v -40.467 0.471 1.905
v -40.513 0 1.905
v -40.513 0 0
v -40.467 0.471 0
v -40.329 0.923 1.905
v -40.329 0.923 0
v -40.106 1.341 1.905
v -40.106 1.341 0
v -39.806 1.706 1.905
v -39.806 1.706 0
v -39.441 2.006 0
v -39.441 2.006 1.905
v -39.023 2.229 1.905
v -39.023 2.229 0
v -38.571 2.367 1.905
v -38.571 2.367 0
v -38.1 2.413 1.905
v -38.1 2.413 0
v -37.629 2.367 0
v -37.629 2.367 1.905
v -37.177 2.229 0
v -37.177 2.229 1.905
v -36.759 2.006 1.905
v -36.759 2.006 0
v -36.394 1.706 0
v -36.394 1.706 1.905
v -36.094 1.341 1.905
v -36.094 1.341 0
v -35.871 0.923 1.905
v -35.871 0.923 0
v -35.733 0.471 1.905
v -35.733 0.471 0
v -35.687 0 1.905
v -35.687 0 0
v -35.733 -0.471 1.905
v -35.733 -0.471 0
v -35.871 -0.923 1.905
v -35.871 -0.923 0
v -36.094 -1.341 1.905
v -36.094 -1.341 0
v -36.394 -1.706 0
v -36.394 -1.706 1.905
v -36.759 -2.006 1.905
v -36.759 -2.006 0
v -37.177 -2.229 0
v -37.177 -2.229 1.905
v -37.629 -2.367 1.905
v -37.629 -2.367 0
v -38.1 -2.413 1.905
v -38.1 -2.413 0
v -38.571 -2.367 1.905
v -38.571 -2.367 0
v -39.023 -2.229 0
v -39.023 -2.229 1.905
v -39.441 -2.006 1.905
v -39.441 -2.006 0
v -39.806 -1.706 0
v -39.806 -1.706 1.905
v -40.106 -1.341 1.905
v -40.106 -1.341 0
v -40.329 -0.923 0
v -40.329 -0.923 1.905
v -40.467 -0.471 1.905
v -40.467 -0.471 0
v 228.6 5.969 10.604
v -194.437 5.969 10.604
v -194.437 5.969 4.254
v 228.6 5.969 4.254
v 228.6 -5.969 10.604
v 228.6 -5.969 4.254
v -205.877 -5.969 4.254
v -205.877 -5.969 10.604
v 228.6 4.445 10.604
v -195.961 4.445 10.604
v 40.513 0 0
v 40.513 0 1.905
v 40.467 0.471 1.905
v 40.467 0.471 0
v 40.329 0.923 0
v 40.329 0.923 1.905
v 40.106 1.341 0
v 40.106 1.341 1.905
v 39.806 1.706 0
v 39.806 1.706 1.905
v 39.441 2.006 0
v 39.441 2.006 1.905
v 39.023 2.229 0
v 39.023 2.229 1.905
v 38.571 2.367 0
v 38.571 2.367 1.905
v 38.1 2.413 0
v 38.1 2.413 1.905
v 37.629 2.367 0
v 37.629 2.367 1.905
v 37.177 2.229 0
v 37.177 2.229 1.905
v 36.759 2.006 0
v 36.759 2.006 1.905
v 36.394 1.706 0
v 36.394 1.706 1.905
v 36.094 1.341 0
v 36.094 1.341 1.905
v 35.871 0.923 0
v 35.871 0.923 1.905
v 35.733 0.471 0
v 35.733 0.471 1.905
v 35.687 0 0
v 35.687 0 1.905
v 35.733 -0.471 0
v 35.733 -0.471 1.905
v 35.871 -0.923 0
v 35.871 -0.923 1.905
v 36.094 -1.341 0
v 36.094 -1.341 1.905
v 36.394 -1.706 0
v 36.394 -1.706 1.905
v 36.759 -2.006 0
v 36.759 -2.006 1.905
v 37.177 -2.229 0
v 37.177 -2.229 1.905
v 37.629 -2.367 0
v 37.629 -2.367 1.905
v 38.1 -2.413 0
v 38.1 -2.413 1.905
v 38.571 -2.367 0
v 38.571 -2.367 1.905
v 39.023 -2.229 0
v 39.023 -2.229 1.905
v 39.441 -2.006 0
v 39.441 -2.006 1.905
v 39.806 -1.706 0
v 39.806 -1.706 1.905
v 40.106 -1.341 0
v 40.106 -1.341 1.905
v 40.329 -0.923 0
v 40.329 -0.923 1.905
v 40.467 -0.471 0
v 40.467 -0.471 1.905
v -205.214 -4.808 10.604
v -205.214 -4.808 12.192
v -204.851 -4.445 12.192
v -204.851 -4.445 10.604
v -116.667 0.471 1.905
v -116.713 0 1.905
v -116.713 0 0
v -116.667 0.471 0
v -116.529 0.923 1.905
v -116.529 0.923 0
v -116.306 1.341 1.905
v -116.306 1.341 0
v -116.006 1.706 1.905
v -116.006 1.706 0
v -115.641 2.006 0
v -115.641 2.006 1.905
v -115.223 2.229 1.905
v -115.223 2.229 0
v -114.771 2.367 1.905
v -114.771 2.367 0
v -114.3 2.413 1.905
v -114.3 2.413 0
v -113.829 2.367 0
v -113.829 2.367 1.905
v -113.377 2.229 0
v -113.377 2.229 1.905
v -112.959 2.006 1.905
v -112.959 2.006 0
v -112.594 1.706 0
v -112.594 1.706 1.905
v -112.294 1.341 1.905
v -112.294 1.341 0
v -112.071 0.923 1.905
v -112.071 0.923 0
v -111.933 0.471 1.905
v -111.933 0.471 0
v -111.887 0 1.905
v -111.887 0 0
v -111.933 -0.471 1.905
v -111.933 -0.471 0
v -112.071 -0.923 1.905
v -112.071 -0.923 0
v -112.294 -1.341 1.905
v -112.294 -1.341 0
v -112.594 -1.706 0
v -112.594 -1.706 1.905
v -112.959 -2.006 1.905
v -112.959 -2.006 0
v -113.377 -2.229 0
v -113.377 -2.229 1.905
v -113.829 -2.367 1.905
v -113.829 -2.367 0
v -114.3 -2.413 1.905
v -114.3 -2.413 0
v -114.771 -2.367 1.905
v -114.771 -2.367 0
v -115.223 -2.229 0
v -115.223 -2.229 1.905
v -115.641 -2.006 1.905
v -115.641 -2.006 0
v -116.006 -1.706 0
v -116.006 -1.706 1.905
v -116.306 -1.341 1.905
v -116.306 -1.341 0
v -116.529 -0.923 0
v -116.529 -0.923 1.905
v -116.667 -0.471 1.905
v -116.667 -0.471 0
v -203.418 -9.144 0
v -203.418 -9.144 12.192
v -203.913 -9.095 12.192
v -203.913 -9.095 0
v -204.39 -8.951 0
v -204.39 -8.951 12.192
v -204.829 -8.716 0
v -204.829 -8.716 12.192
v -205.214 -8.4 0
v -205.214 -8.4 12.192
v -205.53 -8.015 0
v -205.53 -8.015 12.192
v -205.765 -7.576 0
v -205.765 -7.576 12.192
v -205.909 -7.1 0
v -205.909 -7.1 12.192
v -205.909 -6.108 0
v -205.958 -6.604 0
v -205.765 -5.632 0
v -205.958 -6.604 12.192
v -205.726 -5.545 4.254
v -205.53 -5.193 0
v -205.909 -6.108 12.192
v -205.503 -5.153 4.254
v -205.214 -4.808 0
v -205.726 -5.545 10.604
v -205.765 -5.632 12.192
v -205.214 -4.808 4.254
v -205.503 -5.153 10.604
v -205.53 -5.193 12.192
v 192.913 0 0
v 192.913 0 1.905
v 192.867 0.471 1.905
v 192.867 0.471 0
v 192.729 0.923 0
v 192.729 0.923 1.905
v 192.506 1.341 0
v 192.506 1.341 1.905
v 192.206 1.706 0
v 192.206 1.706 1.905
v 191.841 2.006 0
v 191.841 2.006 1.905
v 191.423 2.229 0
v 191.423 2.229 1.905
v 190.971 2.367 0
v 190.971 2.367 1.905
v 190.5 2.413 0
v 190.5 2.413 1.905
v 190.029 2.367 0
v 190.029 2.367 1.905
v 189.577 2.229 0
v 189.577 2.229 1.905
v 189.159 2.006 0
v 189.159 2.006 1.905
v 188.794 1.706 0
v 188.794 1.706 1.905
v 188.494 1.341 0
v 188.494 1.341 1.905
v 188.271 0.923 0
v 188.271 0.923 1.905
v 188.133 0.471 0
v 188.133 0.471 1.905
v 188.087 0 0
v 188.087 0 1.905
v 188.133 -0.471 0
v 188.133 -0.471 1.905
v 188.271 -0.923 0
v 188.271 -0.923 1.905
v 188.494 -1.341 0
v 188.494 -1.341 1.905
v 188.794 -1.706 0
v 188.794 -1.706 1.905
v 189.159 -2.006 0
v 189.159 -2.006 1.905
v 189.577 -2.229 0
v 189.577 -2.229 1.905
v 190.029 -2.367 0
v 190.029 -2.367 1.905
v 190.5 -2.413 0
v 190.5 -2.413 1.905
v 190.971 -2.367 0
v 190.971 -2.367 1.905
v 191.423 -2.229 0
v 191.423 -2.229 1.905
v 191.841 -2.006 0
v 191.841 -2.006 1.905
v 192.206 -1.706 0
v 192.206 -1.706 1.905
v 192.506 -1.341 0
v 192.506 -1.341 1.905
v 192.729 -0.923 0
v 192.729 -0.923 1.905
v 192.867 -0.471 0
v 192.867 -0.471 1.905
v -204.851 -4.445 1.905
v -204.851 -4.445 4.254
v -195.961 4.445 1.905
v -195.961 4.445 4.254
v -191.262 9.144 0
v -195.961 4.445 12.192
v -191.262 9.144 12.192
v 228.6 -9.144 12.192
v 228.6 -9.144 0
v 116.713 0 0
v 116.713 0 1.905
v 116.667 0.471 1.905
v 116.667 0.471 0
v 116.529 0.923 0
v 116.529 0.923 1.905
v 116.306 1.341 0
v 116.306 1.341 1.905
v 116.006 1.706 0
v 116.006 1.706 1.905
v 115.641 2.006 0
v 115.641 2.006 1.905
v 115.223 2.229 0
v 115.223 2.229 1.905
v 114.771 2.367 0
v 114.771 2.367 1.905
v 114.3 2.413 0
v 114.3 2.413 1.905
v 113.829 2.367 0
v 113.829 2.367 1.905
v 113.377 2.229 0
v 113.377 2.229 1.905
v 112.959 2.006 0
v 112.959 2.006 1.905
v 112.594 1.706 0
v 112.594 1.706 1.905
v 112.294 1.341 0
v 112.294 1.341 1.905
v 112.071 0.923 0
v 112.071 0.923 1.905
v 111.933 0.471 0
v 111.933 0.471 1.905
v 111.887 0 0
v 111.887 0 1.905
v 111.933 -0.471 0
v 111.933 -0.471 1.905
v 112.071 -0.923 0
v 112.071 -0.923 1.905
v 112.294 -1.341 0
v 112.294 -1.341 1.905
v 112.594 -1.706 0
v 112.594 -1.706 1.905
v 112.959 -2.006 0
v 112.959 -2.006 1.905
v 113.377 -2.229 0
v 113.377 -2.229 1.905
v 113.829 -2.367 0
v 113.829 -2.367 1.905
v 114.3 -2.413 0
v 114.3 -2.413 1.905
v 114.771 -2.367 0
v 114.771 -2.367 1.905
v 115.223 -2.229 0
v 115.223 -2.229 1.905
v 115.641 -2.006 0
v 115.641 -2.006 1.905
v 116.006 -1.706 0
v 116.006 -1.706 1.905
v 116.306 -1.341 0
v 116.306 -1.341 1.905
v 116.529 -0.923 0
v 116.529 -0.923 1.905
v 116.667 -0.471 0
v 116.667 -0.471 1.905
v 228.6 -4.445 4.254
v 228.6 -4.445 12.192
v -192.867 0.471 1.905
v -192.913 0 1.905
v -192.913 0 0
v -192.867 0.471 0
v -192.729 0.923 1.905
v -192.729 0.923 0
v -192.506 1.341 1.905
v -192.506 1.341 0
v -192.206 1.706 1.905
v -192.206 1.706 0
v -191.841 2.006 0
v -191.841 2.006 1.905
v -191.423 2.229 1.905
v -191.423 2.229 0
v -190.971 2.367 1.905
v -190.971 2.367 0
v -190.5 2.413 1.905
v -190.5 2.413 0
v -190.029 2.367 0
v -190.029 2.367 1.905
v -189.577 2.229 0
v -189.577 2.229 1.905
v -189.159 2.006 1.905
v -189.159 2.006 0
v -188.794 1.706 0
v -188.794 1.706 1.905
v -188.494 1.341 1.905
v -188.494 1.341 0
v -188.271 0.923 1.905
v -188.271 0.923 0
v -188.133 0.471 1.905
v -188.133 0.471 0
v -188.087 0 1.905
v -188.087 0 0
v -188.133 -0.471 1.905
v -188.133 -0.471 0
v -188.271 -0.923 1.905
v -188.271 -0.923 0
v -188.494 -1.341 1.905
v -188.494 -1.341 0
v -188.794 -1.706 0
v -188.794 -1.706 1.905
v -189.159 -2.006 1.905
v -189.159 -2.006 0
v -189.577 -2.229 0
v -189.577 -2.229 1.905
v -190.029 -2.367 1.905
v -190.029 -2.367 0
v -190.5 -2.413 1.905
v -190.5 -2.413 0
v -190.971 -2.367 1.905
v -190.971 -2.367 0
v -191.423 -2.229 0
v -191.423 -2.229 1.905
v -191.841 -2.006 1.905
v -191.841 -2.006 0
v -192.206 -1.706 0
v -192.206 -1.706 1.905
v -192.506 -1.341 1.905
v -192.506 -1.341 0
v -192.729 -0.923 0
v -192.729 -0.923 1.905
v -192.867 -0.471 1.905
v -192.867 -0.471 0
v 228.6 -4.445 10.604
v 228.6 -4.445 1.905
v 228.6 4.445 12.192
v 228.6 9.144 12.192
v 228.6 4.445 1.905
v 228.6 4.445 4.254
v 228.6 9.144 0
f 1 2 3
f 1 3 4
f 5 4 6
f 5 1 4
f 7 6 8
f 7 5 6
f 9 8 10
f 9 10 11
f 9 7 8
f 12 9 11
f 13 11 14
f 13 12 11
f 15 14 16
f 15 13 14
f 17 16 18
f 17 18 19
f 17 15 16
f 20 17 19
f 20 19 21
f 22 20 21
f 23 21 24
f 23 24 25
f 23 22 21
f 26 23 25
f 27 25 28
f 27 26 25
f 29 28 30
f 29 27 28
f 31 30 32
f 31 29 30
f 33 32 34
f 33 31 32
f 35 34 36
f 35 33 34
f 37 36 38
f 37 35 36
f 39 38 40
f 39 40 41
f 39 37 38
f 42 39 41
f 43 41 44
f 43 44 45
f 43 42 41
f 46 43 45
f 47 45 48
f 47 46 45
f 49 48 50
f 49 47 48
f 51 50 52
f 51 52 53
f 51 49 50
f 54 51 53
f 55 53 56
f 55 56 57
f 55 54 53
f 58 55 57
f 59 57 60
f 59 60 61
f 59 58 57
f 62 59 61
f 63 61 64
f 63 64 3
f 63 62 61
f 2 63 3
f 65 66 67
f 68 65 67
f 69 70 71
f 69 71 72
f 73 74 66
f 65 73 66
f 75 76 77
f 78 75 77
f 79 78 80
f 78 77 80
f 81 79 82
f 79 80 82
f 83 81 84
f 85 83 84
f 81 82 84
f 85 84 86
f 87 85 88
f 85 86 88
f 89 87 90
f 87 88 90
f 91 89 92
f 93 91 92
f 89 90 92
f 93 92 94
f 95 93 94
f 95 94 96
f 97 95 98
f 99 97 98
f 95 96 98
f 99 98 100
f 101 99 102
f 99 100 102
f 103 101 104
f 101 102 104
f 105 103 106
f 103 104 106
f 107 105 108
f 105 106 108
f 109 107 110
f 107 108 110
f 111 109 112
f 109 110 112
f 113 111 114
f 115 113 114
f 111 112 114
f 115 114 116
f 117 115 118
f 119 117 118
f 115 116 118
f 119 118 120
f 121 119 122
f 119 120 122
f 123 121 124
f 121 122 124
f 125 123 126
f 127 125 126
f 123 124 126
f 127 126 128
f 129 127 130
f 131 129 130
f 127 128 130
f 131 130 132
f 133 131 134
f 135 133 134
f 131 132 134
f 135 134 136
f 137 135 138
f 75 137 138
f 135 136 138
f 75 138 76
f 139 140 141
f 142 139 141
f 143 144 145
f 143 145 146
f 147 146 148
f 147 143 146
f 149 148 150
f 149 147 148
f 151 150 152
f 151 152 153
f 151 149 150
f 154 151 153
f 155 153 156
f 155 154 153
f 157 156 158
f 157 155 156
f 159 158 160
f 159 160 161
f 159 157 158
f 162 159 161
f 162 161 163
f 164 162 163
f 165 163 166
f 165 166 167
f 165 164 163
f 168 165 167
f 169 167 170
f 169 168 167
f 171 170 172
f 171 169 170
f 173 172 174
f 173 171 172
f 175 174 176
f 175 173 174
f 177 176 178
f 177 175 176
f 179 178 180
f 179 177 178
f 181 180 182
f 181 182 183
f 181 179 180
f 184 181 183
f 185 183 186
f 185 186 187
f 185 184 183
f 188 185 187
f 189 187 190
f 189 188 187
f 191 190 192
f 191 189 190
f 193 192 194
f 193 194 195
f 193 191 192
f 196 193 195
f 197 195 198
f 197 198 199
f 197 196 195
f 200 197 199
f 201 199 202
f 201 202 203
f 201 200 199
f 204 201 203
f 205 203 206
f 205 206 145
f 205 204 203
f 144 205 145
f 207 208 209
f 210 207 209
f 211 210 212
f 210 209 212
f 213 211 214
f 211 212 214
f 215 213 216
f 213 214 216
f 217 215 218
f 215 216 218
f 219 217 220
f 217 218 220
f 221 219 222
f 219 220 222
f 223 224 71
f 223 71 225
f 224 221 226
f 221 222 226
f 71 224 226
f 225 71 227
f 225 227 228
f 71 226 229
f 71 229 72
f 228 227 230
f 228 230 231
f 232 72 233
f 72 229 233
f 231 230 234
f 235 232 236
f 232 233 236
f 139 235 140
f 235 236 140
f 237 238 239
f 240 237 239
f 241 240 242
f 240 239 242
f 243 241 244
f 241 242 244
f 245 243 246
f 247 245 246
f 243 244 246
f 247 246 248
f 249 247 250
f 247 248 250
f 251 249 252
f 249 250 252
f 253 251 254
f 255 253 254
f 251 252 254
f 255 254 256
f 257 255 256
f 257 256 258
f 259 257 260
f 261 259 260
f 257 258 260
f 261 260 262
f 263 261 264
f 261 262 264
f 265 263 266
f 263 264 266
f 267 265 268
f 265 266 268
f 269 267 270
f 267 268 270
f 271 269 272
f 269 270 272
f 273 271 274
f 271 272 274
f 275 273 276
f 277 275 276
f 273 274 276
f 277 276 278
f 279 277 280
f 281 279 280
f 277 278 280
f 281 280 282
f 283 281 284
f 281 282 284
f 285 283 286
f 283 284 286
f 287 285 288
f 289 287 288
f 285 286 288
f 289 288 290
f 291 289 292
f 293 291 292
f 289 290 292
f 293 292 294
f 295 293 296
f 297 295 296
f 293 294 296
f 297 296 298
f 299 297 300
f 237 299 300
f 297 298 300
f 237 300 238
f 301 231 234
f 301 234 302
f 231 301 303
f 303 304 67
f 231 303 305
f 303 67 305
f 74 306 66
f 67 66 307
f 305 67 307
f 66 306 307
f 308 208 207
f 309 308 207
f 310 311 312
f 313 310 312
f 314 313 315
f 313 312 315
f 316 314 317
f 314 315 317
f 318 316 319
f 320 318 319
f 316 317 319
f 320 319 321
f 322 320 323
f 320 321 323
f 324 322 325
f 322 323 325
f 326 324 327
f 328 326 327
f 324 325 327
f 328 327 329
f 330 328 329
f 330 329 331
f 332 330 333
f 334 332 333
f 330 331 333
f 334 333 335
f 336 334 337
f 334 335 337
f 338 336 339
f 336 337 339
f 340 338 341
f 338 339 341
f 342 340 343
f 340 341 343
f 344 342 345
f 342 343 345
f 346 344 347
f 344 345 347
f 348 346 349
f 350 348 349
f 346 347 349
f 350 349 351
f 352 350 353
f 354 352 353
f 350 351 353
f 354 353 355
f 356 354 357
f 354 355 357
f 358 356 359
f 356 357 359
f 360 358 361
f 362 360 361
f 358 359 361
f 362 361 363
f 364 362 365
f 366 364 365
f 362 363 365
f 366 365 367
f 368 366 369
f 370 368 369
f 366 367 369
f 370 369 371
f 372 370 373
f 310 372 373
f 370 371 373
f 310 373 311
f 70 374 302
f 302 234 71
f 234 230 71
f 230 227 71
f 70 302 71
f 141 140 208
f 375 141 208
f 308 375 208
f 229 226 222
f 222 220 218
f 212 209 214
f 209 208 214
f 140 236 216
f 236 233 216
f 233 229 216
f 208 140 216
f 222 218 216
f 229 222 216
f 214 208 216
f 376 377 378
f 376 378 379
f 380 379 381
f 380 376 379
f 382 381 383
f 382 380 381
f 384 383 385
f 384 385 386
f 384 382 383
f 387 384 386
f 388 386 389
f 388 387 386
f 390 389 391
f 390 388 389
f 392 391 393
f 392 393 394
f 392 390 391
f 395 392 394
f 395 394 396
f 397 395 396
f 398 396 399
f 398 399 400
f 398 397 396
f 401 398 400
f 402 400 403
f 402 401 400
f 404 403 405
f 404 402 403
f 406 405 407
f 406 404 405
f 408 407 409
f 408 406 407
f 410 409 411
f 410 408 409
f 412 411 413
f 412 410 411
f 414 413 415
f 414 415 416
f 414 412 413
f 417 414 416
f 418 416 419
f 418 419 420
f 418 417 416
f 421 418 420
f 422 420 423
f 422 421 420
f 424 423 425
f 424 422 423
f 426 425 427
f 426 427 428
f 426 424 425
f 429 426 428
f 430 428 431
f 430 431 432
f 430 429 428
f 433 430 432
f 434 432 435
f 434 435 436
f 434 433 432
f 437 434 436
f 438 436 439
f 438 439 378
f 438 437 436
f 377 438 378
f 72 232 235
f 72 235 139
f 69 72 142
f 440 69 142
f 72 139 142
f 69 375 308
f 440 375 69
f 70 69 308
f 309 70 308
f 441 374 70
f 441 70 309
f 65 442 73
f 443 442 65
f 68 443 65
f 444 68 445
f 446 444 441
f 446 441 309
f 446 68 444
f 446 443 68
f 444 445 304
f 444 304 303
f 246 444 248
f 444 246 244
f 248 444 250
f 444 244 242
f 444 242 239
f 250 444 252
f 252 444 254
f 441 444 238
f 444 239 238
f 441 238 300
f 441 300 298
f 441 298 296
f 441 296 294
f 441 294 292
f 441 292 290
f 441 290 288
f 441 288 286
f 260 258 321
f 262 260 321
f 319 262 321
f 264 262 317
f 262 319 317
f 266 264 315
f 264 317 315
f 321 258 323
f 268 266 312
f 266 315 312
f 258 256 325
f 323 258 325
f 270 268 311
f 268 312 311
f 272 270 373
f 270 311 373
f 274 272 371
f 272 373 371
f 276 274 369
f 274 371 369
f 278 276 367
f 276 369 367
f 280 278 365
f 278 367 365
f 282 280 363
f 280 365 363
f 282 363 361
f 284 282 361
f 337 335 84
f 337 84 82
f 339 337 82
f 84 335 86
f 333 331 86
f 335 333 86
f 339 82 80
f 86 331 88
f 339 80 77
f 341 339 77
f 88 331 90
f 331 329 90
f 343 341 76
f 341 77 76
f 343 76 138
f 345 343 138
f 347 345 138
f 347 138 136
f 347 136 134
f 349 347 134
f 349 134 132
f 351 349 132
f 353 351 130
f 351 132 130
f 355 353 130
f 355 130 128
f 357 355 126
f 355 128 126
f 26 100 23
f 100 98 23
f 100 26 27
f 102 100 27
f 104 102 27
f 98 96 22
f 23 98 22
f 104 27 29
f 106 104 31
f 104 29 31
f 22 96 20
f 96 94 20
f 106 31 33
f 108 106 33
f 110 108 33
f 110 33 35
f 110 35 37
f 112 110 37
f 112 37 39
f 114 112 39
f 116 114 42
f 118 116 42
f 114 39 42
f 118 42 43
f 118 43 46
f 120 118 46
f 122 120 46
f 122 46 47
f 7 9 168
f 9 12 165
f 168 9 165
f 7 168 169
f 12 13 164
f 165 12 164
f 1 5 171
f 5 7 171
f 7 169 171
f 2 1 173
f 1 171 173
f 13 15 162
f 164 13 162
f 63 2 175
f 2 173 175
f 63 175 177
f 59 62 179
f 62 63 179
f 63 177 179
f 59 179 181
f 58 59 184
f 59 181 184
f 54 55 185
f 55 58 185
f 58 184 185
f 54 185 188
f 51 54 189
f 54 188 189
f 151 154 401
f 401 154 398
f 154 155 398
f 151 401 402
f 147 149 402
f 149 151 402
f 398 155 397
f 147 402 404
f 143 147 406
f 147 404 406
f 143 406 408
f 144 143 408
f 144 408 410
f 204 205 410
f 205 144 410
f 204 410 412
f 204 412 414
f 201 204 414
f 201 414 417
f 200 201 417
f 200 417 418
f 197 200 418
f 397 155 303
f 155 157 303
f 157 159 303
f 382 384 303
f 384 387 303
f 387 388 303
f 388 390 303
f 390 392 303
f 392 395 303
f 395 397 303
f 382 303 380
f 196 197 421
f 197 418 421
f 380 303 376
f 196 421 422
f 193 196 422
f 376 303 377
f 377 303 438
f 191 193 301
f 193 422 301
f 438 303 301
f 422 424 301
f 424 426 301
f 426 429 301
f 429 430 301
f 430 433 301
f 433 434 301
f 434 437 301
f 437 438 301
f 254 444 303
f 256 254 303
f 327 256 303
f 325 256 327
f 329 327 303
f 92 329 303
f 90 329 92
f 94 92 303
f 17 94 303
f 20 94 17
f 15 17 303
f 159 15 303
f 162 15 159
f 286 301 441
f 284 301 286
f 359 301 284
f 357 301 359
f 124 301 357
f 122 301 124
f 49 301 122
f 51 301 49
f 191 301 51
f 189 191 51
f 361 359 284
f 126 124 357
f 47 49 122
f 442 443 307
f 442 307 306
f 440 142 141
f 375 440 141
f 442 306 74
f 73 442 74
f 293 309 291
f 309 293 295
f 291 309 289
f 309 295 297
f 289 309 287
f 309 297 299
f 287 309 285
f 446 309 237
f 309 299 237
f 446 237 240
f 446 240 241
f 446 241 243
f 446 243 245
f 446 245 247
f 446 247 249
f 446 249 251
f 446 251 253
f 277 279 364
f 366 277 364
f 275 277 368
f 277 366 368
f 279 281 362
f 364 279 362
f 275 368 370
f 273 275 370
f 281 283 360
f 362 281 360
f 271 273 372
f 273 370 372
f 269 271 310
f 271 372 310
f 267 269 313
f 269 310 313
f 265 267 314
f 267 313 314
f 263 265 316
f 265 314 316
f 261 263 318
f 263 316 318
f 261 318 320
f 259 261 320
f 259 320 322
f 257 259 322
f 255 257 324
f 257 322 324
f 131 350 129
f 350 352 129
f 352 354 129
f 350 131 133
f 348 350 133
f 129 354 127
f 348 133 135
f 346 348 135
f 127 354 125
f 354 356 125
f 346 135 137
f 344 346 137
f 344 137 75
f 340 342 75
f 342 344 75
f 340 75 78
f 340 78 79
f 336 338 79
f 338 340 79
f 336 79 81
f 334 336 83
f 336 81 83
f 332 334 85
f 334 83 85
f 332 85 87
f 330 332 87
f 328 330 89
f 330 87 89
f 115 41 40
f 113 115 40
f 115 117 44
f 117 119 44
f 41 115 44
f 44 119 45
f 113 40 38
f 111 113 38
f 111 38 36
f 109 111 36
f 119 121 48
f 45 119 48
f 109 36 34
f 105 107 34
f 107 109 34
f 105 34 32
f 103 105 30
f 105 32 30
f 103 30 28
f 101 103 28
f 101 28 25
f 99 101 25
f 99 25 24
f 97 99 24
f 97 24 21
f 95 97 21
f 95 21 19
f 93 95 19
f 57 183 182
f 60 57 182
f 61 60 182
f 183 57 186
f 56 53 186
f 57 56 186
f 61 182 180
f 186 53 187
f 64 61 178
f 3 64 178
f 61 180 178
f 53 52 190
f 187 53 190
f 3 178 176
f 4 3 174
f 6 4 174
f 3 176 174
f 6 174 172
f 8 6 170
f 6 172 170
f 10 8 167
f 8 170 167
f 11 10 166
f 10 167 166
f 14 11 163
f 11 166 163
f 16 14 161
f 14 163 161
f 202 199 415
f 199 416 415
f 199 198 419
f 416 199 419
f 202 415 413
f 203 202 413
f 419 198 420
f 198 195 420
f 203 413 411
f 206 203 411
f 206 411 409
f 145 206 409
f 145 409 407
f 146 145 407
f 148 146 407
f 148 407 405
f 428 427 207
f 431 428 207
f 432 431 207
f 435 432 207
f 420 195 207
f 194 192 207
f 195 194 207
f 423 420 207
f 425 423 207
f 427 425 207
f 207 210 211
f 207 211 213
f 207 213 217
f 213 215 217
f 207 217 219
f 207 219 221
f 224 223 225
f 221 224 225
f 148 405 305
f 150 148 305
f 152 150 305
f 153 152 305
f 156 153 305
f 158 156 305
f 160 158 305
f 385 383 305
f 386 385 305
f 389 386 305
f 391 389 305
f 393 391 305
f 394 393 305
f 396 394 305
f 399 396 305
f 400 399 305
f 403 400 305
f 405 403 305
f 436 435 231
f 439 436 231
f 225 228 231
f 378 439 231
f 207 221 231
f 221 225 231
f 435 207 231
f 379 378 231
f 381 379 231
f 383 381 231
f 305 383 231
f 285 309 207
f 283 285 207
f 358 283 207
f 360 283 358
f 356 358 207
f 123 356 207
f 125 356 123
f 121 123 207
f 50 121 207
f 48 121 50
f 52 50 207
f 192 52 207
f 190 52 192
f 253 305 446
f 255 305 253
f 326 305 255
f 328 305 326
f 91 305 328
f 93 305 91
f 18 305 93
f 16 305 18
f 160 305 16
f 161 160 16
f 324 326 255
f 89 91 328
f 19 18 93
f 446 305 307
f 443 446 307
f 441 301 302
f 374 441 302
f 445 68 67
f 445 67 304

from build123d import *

# Parameters (mm, degrees)
BOSS_EXTRUDE1_DEPTH = 228.6
SKETCH3_R           = 2.413
CUT_EXTRUDE1_DEPTH  = 1.905
LPATTERN1_COUNT     = 3
LPATTERN1_PITCH     = 76.2
CUT_EXTRUDE3_DEPTH  = 230.107436806
FILLET1_R           = 2.54


with BuildPart() as part:
    # Sketch2 → Boss-Extrude1 (new, symmetric)
    with BuildSketch(Plane(origin=(0, 0, 0), x_dir=(0, 0, -1), z_dir=(1, 0, 0))):
        Polygon((0, 9.144), (-12.192, 9.144), (-12.192, 4.445), (-10.6045, 4.445), (-10.6045, 5.969), (-4.2545, 5.969), (-4.2545, 4.445), (-1.905, 4.445), (-1.905, -4.445), (-4.2545, -4.445), (-4.2545, -5.969), (-10.6045, -5.969), (-10.6045, -4.445), (-12.192, -4.445), (-12.192, -9.144), (0, -9.144), align=None)
    extrude(amount=BOSS_EXTRUDE1_DEPTH, both=True)

    # Sketch3 → Cut-Extrude1 (cut)
    with BuildSketch(Plane.XY.offset(1.905)):
        with Locations((38.1, 0)):
            Circle(SKETCH3_R)
    cut_extrude1 = extrude(amount=-CUT_EXTRUDE1_DEPTH, mode=Mode.SUBTRACT)

    # LPattern1: Cut-Extrude1 ×3
    with Locations(*[(i * LPATTERN1_PITCH, 0, 0) for i in range(1, LPATTERN1_COUNT)]):
        add(cut_extrude1, mode=Mode.SUBTRACT)

    # SurfaceCut1
    split(bisect_by=Plane(origin=(0, 0, 0), x_dir=(0, 0, -1), z_dir=(1, 0, 0)), keep=Keep.TOP)

    # Mirror1: part across plane


with BuildPart() as part_1:
    add(part.part)
    add(part.part.mirror(Plane(origin=(0, 0, 0), x_dir=(0, 0, 1), z_dir=(1, 0, 0))))

    # Sketch4 → Cut-Extrude3 (cut, through all)
    with BuildSketch(Plane.XY.offset(12.192)):
        Polygon((-209.55, -9.144), (-191.262, 9.144), (-228.6, 9.144), (-228.6, -9.144), align=None)
    extrude(amount=-CUT_EXTRUDE3_DEPTH, mode=Mode.SUBTRACT)

    # Fillet1
    # the kernel refuses this fillet: 2.54 mm, written as the material it takes off along each edge
    with BuildSketch(Plane(origin=(-209.55, -9.144, 27.522256121), x_dir=(0.7071067811865455, 0.7071067811865496, 0), z_dir=(0, 0, -1))) as fillet1_piece_1:
        with BuildLine():
            CenterArc((FILLET1_R * 2.41421356237, FILLET1_R), FILLET1_R, 135, 135)
            Line((FILLET1_R * 1.70710678119, FILLET1_R * 1.70710678119), (0, 0))
            Line((0, 0), (FILLET1_R * 2.41421356237, 0))
        make_face()
    extrude(amount=42.852512242, mode=Mode.SUBTRACT)


solid = part_1.part
